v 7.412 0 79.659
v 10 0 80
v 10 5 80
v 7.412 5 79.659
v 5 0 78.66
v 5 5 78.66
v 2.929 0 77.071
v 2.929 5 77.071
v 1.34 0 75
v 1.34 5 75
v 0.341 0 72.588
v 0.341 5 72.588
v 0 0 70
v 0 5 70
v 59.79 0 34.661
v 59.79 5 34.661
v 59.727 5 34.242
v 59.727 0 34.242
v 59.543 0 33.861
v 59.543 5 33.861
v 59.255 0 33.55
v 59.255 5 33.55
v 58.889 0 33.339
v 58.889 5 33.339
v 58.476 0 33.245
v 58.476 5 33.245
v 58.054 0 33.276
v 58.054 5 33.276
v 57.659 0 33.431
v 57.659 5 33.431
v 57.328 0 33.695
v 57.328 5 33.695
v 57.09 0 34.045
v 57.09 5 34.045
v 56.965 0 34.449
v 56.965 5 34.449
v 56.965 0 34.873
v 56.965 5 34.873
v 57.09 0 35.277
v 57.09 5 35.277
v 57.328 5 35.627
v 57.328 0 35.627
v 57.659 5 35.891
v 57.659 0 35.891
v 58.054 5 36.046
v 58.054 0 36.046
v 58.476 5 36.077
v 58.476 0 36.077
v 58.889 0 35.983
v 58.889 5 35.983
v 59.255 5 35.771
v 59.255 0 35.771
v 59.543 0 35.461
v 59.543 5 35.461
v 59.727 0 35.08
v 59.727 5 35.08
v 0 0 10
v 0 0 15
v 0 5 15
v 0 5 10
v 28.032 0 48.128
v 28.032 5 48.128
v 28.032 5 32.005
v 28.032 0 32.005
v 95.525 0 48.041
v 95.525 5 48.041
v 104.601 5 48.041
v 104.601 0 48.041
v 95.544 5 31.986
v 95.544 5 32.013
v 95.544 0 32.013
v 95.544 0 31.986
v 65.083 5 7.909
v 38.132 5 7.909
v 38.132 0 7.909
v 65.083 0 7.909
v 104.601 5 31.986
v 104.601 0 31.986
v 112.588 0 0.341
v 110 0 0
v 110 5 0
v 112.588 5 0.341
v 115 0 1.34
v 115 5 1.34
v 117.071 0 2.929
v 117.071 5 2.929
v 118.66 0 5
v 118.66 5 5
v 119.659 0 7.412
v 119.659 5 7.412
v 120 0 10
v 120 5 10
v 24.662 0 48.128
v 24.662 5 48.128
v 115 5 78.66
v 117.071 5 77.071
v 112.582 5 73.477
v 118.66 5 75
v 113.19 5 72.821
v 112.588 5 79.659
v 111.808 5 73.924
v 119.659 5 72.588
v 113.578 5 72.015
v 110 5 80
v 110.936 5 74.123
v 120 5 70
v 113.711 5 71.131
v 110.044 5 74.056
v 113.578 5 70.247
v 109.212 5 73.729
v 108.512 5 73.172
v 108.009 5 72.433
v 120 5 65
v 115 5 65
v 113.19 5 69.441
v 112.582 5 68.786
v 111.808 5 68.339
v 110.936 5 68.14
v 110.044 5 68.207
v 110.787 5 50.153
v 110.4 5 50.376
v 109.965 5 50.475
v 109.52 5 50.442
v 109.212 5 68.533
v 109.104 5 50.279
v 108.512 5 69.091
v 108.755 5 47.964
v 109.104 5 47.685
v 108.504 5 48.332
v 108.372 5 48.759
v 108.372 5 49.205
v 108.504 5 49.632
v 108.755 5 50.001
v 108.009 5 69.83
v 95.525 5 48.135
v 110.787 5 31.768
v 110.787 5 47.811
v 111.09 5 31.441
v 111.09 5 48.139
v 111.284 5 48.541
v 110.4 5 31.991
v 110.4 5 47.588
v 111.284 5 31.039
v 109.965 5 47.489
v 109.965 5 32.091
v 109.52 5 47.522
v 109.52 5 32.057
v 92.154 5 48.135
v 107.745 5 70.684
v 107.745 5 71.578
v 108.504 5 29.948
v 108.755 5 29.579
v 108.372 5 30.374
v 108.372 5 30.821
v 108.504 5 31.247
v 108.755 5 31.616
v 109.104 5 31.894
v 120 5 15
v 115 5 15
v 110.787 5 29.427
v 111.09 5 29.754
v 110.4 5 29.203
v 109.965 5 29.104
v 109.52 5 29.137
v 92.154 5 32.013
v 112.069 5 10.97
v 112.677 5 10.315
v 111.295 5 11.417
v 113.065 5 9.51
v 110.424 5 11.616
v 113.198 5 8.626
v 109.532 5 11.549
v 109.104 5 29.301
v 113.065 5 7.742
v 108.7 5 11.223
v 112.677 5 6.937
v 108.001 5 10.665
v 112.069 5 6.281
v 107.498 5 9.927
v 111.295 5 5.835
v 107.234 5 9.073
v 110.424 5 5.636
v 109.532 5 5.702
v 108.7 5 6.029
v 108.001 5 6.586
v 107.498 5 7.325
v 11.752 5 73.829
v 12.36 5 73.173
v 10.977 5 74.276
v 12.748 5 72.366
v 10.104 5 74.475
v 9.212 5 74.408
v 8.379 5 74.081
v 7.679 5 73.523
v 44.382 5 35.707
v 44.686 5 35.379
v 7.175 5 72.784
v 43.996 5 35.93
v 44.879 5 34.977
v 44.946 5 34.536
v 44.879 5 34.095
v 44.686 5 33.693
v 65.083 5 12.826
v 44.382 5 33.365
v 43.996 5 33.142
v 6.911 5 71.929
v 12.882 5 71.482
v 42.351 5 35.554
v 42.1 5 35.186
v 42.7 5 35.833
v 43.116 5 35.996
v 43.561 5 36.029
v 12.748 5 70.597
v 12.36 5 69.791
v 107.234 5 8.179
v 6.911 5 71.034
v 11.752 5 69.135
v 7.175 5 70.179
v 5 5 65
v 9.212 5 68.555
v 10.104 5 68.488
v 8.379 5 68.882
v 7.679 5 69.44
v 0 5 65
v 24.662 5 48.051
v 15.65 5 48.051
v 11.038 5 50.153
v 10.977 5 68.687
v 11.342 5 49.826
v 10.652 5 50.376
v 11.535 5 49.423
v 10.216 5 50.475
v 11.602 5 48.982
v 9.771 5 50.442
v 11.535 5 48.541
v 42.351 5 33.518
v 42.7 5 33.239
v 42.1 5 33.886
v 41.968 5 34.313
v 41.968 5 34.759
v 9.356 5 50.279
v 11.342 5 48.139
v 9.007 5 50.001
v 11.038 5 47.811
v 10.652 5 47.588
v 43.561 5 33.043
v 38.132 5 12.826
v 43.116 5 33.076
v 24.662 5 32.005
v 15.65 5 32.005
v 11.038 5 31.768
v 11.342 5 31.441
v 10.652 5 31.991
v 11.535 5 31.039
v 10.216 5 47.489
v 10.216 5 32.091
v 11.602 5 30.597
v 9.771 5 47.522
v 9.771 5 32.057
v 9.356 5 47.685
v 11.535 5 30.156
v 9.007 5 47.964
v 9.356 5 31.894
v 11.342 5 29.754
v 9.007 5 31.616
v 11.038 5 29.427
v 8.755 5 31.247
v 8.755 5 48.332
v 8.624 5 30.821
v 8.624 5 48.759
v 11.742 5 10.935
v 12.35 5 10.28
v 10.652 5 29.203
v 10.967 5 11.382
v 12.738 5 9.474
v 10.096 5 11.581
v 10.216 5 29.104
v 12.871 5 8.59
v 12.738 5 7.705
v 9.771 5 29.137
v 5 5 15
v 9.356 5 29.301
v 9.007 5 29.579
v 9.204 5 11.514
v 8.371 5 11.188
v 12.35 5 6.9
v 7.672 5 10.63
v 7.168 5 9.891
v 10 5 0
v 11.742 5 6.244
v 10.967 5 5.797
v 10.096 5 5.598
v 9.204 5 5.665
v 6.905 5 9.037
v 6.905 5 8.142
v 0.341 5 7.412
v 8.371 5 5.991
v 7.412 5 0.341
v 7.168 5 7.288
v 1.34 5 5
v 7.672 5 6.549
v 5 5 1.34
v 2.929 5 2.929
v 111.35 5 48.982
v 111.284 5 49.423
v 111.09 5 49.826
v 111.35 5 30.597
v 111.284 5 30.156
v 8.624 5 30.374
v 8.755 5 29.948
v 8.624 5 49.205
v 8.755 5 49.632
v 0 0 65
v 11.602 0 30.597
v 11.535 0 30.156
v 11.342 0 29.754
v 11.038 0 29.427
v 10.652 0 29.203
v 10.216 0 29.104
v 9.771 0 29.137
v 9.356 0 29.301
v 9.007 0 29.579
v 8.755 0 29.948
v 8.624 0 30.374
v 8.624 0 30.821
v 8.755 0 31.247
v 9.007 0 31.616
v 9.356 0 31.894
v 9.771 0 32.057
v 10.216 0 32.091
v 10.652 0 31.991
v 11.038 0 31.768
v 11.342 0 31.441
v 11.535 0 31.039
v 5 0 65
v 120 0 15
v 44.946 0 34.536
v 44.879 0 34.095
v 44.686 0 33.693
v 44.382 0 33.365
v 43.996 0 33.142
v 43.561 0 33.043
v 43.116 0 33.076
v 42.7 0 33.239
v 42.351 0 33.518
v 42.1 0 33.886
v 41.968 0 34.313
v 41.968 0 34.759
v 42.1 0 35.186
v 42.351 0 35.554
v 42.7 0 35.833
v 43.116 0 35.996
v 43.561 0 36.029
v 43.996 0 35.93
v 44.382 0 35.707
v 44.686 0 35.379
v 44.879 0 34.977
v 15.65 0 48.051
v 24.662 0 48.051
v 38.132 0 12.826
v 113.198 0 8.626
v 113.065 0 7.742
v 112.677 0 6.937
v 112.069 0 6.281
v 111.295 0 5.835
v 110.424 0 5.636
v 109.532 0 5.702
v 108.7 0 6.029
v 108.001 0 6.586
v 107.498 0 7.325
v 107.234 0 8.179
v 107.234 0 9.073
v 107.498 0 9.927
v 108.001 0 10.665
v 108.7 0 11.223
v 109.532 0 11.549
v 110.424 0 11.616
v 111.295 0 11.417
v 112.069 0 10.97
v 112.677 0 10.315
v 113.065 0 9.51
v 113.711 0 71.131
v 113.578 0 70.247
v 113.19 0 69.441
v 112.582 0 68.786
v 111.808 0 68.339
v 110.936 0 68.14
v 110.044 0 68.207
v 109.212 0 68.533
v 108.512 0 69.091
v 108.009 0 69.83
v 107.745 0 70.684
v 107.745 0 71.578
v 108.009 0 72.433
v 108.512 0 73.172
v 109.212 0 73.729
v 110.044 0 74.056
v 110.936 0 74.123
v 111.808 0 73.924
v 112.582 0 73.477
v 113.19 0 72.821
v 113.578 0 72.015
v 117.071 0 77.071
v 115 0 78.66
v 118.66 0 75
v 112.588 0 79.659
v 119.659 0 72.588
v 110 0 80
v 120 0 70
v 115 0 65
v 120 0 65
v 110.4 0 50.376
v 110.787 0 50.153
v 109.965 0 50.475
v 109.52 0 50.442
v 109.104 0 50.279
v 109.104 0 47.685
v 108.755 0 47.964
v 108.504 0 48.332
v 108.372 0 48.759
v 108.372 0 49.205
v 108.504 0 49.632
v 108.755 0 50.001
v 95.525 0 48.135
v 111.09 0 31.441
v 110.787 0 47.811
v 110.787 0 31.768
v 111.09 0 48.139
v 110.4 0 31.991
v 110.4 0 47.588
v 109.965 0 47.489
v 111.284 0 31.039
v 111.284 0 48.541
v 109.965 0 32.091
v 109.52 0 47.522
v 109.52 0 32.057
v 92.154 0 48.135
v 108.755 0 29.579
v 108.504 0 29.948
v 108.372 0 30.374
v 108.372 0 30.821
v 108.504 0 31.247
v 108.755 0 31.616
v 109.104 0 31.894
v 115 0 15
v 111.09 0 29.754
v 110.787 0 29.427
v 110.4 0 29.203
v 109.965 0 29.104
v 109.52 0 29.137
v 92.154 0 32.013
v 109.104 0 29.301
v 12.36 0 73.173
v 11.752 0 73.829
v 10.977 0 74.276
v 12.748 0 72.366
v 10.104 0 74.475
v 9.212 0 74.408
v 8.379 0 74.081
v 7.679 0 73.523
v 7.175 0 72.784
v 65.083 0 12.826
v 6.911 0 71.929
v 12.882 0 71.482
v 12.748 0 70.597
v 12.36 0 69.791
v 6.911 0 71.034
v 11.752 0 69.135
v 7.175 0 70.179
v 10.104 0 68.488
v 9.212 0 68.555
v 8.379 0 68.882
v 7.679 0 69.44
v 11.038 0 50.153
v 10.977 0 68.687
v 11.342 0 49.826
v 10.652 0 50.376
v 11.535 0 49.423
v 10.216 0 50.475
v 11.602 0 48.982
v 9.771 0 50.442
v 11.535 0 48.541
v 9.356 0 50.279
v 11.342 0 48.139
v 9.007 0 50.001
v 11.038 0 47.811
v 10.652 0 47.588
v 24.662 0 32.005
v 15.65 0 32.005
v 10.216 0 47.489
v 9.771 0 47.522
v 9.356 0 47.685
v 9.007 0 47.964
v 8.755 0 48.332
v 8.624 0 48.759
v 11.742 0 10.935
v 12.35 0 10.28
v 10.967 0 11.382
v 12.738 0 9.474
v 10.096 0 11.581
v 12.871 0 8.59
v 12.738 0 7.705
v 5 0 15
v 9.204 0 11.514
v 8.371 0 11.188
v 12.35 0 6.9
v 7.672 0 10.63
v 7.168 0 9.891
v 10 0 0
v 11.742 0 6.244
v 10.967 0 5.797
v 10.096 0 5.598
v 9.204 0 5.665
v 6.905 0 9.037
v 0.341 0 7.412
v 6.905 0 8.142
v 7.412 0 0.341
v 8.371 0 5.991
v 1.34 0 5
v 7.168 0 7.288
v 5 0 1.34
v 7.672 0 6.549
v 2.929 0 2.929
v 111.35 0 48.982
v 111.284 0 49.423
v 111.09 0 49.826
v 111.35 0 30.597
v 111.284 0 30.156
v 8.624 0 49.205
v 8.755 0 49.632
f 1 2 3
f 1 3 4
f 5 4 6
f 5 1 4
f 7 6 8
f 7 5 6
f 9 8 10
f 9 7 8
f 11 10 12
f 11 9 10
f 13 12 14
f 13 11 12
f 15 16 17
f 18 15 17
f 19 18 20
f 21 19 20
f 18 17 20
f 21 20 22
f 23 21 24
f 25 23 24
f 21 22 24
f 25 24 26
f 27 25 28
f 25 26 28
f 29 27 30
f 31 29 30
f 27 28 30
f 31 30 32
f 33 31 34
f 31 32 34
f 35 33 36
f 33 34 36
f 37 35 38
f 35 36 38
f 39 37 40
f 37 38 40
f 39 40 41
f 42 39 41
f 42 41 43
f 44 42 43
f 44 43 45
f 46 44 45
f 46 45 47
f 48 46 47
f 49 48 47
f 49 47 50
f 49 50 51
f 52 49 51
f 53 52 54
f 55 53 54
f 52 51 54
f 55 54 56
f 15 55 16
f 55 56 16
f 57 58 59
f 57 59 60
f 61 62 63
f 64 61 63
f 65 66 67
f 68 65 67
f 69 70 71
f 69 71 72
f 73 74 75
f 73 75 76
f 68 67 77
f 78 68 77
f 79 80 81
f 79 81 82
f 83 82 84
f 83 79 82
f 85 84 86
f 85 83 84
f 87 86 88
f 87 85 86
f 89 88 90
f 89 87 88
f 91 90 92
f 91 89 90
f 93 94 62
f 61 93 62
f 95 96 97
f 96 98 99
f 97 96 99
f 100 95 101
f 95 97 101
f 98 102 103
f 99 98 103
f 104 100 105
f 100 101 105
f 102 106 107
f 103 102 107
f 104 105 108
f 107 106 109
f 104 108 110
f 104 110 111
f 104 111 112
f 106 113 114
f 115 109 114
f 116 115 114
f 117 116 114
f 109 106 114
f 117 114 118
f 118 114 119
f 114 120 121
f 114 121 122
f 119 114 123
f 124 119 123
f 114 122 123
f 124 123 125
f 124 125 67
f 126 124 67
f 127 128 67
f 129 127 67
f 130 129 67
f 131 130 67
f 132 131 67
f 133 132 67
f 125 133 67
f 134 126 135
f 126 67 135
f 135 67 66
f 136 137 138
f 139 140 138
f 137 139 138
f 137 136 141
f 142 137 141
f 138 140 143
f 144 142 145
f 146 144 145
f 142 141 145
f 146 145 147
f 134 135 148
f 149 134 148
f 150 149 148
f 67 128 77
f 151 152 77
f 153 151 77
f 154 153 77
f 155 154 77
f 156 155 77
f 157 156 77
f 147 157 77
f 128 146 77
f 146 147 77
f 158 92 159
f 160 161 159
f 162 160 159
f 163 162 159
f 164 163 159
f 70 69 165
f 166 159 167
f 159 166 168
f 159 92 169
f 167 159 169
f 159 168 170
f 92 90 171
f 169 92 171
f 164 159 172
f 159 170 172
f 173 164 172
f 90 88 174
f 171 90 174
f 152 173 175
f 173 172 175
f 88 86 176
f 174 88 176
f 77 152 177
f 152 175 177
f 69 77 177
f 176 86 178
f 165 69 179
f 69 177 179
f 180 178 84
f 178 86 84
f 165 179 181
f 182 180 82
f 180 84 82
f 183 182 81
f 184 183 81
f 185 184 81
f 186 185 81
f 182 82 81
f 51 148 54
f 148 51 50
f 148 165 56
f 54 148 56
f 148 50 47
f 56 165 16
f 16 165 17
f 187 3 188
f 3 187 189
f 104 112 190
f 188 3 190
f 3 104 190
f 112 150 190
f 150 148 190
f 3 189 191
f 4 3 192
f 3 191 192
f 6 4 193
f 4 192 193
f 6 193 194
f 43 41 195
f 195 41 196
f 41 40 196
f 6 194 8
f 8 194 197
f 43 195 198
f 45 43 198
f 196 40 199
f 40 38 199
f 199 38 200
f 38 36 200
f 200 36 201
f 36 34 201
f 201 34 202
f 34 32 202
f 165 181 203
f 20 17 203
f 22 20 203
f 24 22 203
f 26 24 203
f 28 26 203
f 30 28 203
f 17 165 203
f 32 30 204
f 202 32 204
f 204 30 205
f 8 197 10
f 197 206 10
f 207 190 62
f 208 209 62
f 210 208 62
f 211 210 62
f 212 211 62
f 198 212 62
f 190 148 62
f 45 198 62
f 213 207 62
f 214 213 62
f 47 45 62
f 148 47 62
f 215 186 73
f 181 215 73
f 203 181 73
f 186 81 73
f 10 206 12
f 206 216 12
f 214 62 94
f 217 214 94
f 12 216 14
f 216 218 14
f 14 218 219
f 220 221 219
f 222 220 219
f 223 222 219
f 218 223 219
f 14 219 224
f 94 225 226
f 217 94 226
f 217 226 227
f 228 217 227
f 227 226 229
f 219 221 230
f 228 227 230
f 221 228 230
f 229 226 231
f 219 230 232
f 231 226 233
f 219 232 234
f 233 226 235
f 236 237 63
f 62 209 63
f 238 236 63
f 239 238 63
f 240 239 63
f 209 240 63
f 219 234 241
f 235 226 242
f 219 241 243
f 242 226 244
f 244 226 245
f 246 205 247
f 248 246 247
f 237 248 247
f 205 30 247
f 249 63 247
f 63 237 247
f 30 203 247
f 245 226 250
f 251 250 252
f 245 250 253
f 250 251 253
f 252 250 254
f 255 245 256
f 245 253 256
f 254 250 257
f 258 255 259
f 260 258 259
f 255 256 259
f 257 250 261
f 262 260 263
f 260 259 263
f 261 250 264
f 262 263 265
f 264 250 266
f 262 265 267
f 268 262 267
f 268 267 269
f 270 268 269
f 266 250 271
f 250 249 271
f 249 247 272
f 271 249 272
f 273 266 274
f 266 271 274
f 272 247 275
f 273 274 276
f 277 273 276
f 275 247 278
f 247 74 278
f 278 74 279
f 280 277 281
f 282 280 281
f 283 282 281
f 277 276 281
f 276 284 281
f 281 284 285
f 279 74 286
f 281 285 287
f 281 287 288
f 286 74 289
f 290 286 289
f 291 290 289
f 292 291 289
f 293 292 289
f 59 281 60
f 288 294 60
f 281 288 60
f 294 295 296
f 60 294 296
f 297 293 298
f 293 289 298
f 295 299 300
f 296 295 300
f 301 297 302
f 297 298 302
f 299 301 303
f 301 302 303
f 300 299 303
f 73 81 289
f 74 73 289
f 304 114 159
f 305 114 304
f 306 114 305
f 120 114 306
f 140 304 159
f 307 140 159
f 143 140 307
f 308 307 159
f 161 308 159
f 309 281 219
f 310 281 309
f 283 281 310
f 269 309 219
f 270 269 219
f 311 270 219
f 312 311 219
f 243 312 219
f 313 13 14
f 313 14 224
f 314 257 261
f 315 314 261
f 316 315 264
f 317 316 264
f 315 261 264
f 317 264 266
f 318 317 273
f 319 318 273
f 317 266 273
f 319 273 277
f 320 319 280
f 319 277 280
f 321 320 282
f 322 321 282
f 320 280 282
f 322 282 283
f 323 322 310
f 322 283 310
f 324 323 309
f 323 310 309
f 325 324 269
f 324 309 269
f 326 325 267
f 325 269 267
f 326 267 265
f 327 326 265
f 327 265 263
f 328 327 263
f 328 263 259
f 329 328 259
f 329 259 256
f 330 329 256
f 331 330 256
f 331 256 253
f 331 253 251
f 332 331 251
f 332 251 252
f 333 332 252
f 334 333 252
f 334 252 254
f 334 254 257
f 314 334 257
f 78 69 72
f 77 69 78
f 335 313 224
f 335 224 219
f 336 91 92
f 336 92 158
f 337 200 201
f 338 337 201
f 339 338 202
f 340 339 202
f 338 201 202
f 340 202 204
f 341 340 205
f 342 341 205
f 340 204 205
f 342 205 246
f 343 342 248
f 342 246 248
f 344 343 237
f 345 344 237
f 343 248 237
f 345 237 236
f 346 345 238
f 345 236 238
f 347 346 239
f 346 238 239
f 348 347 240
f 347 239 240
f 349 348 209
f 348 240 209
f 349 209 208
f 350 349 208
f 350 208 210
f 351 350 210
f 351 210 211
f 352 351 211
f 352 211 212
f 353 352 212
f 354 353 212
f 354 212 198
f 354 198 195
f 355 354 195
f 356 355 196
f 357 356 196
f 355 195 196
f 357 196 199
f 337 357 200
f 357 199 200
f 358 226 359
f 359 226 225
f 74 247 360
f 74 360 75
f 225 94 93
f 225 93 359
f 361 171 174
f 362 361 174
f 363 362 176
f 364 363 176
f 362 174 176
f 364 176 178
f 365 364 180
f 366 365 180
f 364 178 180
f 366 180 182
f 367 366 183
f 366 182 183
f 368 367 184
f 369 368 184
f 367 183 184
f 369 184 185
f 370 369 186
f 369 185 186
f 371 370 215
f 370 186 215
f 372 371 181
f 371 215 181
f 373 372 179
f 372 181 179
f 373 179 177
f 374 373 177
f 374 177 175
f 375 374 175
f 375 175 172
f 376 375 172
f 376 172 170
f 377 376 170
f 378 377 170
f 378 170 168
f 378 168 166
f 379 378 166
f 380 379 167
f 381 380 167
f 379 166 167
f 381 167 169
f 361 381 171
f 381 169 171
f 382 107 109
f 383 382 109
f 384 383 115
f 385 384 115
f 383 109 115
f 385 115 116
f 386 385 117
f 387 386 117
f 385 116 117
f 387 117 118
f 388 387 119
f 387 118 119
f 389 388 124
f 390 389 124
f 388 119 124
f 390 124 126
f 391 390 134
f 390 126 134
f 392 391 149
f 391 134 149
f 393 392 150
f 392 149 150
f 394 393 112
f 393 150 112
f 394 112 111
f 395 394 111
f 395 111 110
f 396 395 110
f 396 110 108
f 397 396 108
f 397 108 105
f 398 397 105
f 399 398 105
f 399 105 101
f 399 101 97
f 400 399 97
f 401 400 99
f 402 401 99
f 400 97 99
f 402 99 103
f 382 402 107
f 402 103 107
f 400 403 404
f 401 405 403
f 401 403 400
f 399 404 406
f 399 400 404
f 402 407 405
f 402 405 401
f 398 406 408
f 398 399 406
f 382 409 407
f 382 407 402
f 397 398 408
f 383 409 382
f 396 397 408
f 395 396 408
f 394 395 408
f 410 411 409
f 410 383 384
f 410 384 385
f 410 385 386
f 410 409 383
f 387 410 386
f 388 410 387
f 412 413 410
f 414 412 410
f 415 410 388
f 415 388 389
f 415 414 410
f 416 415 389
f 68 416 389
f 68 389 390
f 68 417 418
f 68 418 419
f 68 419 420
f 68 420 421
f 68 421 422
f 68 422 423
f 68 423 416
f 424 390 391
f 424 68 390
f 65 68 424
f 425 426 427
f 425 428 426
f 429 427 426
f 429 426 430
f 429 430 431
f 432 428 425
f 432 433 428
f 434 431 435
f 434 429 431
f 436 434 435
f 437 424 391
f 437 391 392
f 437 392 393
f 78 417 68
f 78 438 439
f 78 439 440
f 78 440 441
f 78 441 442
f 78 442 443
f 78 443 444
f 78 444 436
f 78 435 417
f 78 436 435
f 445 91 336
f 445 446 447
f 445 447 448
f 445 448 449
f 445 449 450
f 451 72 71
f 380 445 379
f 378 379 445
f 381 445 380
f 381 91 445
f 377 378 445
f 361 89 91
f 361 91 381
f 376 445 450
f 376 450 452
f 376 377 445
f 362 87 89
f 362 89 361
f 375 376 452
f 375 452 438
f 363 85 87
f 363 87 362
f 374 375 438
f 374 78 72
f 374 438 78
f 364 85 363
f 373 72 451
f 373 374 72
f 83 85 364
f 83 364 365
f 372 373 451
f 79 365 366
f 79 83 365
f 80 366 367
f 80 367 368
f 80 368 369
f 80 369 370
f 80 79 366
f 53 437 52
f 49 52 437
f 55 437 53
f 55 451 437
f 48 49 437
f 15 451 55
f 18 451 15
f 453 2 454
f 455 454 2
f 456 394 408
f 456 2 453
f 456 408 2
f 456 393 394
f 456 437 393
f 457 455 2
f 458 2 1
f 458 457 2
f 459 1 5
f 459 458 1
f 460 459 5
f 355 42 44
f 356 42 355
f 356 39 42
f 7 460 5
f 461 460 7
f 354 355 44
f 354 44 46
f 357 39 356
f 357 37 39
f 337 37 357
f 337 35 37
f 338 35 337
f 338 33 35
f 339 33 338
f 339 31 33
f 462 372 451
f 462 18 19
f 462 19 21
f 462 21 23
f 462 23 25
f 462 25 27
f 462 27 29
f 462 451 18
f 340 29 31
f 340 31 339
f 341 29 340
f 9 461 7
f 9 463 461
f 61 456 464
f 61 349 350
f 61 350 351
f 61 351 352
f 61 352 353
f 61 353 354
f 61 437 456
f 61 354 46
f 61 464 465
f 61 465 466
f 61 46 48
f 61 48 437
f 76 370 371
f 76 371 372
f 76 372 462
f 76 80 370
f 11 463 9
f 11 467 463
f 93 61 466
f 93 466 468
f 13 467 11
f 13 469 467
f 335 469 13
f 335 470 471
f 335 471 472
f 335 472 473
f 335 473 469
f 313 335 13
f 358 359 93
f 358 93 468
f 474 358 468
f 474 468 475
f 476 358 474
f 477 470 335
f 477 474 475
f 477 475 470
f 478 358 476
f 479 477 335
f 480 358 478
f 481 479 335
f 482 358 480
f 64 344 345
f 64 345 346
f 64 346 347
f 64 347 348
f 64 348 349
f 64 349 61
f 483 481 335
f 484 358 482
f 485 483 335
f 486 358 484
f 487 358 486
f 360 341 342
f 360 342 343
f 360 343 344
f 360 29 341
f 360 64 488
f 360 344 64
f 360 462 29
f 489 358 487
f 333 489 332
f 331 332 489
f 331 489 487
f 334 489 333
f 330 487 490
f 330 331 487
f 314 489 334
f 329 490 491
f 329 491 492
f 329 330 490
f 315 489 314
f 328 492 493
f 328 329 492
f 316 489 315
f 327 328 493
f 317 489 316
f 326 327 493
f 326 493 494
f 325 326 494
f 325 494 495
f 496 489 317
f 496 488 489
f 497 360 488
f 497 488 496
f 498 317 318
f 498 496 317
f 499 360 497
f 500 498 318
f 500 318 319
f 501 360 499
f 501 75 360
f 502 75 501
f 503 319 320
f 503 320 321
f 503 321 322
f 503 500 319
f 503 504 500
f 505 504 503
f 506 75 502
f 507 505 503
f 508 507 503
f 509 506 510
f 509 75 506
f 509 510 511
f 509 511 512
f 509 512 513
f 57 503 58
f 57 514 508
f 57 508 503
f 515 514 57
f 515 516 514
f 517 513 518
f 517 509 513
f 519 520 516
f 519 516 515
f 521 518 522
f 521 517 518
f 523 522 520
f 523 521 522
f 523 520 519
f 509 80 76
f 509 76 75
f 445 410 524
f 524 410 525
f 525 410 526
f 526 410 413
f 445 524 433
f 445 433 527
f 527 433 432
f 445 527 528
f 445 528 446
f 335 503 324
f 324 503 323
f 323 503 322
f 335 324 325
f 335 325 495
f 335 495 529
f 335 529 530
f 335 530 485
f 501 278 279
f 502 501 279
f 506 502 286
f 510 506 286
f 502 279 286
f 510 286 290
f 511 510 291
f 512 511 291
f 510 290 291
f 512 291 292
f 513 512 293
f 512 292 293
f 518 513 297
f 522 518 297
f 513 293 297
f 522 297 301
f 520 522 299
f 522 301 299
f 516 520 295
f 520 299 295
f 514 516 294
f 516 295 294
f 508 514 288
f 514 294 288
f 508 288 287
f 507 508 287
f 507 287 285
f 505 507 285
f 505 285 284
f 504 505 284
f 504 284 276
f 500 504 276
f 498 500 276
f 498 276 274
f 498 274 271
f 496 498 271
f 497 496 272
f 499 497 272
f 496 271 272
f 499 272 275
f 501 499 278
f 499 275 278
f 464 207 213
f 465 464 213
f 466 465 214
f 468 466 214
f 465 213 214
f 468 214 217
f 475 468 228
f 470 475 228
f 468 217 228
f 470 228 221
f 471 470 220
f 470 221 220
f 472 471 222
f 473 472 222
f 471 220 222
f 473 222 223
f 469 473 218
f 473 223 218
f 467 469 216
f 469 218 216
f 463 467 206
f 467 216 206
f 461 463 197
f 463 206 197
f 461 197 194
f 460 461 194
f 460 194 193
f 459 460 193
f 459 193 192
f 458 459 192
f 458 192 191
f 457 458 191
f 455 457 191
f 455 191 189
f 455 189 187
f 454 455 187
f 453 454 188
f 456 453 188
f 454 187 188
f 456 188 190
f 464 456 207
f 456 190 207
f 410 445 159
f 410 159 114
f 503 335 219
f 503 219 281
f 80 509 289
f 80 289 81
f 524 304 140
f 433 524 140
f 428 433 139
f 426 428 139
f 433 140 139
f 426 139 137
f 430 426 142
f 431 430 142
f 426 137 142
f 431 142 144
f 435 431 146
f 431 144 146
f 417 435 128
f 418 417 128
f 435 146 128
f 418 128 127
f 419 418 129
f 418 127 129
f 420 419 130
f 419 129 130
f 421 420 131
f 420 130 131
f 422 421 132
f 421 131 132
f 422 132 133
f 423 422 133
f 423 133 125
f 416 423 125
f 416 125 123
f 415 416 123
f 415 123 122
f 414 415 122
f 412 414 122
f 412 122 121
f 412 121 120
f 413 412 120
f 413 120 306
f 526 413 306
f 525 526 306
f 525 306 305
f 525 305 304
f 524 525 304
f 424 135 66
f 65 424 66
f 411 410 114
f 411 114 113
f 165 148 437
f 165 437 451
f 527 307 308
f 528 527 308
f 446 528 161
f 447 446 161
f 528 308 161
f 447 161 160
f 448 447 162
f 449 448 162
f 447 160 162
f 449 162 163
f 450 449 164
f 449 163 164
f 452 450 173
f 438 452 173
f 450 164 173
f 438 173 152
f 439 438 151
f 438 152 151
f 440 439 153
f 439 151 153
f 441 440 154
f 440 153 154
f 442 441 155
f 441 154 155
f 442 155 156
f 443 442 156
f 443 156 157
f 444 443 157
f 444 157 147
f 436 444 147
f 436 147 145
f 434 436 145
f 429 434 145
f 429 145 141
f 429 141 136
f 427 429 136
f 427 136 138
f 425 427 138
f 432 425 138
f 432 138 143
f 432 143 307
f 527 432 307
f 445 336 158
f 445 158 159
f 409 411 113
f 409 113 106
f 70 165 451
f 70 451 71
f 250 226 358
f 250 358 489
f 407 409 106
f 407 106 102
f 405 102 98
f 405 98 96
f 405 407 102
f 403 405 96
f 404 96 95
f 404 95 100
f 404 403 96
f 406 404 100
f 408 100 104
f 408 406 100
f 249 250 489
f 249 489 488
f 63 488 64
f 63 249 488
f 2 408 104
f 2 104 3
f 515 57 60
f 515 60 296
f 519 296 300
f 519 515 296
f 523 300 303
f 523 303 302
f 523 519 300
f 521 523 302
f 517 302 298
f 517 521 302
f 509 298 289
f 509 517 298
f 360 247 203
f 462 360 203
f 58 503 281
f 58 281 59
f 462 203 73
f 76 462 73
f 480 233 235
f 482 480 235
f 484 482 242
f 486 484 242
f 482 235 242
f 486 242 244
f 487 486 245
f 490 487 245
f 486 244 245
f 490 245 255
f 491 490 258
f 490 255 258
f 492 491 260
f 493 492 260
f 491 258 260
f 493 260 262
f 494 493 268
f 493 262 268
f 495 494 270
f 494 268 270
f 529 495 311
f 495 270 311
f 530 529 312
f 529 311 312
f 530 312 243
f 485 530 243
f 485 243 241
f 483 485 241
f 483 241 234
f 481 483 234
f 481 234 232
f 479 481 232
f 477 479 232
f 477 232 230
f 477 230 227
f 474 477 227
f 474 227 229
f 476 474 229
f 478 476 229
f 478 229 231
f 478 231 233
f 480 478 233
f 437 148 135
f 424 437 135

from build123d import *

# Parameters (mm, degrees)
BOSS_EXTRUDE1_DEPTH = 5
SKETCH2_R           = 3
SKETCH2_R_2         = 3.002001364
SKETCH2_R_3         = 2.999925667
SKETCH2_R_4         = 2.998527559
CUT_EXTRUDE2_DEPTH  = 5
SKETCH6_W           = 9.011632363
SKETCH6_H           = 16.045928836
SKETCH6_W_2         = 9.056347314
SKETCH6_H_2         = 16.054931831
CUT_EXTRUDE4_DEPTH  = 5
SKETCH8_R           = 1.49722604
SKETCH8_R_2         = 1.420293569
CUT_EXTRUDE6_DEPTH  = 5
SKETCH16_W          = 26.950881965
SKETCH16_H          = 4.917135509
CUT_EXTRUDE9_DEPTH  = 5
SKETCH11_R          = 1.497426658
SKETCH11_W          = 3.370796783
SKETCH11_H          = 16.122720009
CUT_EXTRUDE10_DEPTH = 10
SKETCH18_W          = 2.969435554
SKETCH18_H          = 16.028197631
CUT_EXTRUDE11_DEPTH = 10


with BuildPart() as part:
    # Sketch1 → Boss-Extrude1 (new body)
    with BuildSketch(Plane(origin=(0, 0, 0), x_dir=(1, 0, 0), z_dir=(0, 1, 0))):
        with BuildLine():
            Line((10, 0), (110, 0))
            ThreePointArc((110, 0), (117.071067812, -2.928932188), (120, -10))
            Line((120, -10), (120, -15))
            Line((120, -15), (115, -15))
            Line((115, -15), (115, -65))
            Line((115, -65), (120, -65))
            Line((120, -65), (120, -70))
            ThreePointArc((120, -70), (117.071067812, -77.071067812), (110, -80))
            Line((110, -80), (10, -80))
            ThreePointArc((10, -80), (2.928932188, -77.071067812), (0, -70))
            Line((0, -70), (0, -65))
            Line((0, -65), (5, -65))
            Line((5, -65), (5, -15))
            Line((5, -15), (0, -15))
            Line((0, -15), (0, -10))
            ThreePointArc((0, -10), (2.928932188, -2.928932188), (10, 0))
        make_face()
    extrude(amount=BOSS_EXTRUDE1_DEPTH)

    # Sketch2 → Cut-Extrude2 (cut)
    with BuildSketch(Plane(origin=(0, 5, 0), x_dir=(1, 0, 0), z_dir=(0, 1, 0))):
        with Locations((9.871405569, -8.58955783)):
            Circle(SKETCH2_R)
        with Locations((9.87978839, -71.481609293)):
            Circle(SKETCH2_R_2)
        with Locations((110.711521692, -71.131223036)):
            Circle(SKETCH2_R_3)
        with Locations((110.199519212, -8.625779617)):
            Circle(SKETCH2_R_4)
    extrude(amount=-CUT_EXTRUDE2_DEPTH, mode=Mode.SUBTRACT)

    # Sketch6 → Cut-Extrude4 (cut)
    with BuildSketch(Plane(origin=(0, 5, 0), x_dir=(1, 0, 0), z_dir=(0, 1, 0))):
        with Locations((20.155698208, -40.027815076)):
            Rectangle(SKETCH6_W, SKETCH6_H)
        with Locations((100.072460304, -40.013270259)):
            Rectangle(SKETCH6_W_2, SKETCH6_H_2)
    extrude(amount=-CUT_EXTRUDE4_DEPTH, mode=Mode.SUBTRACT)

    # Sketch8 → Cut-Extrude6 (cut)
    with BuildSketch(Plane(origin=(0, 5, 0), x_dir=(1, 0, 0), z_dir=(0, 1, 0))):
        with Locations((43.448740086, -34.53592606)):
            Circle(SKETCH8_R)
        with Locations((58.369614813, -34.660876222)):
            Circle(SKETCH8_R_2)
    extrude(amount=-CUT_EXTRUDE6_DEPTH, mode=Mode.SUBTRACT)

    # Sketch16 → Cut-Extrude9 (cut)
    with BuildSketch(Plane(origin=(0, 5, 0), x_dir=(1, 0, 0), z_dir=(0, 1, 0))):
        with Locations((51.607602958, -10.367487293)):
            Rectangle(SKETCH16_W, SKETCH16_H)
    extrude(amount=-CUT_EXTRUDE9_DEPTH, mode=Mode.SUBTRACT)

    # Sketch11 → Cut-Extrude10 (cut)
    with BuildSketch(Plane(origin=(0, 5, 0), x_dir=(1, 0, 0), z_dir=(0, 1, 0))):
        with Locations((10.104440234, -30.597351974)):
            Circle(SKETCH11_R)
        with Locations((10.104440234, -48.982097467)):
            Circle(SKETCH11_R)
        with Locations((109.853007641, -30.597351974)):
            Circle(SKETCH11_R)
        with Locations((109.853007641, -48.982097467)):
            Circle(SKETCH11_R)
        with Locations((93.839893868, -40.073898548)):
            Rectangle(SKETCH11_W, SKETCH11_H)
        with Locations((26.346912782, -40.066210662)):
            Rectangle(SKETCH11_W, SKETCH11_H)
    extrude(amount=-CUT_EXTRUDE10_DEPTH, mode=Mode.SUBTRACT)

    # Sketch18 → Cut-Extrude11 (cut)
    with BuildSketch(Plane(origin=(0, 5, 0), x_dir=(1, 0, 0), z_dir=(0, 1, 0))):
        with Locations((95.940490682, -40.026637359)):
            Rectangle(SKETCH18_W, SKETCH18_H)
    extrude(amount=-CUT_EXTRUDE11_DEPTH, mode=Mode.SUBTRACT)


solid = part.part
